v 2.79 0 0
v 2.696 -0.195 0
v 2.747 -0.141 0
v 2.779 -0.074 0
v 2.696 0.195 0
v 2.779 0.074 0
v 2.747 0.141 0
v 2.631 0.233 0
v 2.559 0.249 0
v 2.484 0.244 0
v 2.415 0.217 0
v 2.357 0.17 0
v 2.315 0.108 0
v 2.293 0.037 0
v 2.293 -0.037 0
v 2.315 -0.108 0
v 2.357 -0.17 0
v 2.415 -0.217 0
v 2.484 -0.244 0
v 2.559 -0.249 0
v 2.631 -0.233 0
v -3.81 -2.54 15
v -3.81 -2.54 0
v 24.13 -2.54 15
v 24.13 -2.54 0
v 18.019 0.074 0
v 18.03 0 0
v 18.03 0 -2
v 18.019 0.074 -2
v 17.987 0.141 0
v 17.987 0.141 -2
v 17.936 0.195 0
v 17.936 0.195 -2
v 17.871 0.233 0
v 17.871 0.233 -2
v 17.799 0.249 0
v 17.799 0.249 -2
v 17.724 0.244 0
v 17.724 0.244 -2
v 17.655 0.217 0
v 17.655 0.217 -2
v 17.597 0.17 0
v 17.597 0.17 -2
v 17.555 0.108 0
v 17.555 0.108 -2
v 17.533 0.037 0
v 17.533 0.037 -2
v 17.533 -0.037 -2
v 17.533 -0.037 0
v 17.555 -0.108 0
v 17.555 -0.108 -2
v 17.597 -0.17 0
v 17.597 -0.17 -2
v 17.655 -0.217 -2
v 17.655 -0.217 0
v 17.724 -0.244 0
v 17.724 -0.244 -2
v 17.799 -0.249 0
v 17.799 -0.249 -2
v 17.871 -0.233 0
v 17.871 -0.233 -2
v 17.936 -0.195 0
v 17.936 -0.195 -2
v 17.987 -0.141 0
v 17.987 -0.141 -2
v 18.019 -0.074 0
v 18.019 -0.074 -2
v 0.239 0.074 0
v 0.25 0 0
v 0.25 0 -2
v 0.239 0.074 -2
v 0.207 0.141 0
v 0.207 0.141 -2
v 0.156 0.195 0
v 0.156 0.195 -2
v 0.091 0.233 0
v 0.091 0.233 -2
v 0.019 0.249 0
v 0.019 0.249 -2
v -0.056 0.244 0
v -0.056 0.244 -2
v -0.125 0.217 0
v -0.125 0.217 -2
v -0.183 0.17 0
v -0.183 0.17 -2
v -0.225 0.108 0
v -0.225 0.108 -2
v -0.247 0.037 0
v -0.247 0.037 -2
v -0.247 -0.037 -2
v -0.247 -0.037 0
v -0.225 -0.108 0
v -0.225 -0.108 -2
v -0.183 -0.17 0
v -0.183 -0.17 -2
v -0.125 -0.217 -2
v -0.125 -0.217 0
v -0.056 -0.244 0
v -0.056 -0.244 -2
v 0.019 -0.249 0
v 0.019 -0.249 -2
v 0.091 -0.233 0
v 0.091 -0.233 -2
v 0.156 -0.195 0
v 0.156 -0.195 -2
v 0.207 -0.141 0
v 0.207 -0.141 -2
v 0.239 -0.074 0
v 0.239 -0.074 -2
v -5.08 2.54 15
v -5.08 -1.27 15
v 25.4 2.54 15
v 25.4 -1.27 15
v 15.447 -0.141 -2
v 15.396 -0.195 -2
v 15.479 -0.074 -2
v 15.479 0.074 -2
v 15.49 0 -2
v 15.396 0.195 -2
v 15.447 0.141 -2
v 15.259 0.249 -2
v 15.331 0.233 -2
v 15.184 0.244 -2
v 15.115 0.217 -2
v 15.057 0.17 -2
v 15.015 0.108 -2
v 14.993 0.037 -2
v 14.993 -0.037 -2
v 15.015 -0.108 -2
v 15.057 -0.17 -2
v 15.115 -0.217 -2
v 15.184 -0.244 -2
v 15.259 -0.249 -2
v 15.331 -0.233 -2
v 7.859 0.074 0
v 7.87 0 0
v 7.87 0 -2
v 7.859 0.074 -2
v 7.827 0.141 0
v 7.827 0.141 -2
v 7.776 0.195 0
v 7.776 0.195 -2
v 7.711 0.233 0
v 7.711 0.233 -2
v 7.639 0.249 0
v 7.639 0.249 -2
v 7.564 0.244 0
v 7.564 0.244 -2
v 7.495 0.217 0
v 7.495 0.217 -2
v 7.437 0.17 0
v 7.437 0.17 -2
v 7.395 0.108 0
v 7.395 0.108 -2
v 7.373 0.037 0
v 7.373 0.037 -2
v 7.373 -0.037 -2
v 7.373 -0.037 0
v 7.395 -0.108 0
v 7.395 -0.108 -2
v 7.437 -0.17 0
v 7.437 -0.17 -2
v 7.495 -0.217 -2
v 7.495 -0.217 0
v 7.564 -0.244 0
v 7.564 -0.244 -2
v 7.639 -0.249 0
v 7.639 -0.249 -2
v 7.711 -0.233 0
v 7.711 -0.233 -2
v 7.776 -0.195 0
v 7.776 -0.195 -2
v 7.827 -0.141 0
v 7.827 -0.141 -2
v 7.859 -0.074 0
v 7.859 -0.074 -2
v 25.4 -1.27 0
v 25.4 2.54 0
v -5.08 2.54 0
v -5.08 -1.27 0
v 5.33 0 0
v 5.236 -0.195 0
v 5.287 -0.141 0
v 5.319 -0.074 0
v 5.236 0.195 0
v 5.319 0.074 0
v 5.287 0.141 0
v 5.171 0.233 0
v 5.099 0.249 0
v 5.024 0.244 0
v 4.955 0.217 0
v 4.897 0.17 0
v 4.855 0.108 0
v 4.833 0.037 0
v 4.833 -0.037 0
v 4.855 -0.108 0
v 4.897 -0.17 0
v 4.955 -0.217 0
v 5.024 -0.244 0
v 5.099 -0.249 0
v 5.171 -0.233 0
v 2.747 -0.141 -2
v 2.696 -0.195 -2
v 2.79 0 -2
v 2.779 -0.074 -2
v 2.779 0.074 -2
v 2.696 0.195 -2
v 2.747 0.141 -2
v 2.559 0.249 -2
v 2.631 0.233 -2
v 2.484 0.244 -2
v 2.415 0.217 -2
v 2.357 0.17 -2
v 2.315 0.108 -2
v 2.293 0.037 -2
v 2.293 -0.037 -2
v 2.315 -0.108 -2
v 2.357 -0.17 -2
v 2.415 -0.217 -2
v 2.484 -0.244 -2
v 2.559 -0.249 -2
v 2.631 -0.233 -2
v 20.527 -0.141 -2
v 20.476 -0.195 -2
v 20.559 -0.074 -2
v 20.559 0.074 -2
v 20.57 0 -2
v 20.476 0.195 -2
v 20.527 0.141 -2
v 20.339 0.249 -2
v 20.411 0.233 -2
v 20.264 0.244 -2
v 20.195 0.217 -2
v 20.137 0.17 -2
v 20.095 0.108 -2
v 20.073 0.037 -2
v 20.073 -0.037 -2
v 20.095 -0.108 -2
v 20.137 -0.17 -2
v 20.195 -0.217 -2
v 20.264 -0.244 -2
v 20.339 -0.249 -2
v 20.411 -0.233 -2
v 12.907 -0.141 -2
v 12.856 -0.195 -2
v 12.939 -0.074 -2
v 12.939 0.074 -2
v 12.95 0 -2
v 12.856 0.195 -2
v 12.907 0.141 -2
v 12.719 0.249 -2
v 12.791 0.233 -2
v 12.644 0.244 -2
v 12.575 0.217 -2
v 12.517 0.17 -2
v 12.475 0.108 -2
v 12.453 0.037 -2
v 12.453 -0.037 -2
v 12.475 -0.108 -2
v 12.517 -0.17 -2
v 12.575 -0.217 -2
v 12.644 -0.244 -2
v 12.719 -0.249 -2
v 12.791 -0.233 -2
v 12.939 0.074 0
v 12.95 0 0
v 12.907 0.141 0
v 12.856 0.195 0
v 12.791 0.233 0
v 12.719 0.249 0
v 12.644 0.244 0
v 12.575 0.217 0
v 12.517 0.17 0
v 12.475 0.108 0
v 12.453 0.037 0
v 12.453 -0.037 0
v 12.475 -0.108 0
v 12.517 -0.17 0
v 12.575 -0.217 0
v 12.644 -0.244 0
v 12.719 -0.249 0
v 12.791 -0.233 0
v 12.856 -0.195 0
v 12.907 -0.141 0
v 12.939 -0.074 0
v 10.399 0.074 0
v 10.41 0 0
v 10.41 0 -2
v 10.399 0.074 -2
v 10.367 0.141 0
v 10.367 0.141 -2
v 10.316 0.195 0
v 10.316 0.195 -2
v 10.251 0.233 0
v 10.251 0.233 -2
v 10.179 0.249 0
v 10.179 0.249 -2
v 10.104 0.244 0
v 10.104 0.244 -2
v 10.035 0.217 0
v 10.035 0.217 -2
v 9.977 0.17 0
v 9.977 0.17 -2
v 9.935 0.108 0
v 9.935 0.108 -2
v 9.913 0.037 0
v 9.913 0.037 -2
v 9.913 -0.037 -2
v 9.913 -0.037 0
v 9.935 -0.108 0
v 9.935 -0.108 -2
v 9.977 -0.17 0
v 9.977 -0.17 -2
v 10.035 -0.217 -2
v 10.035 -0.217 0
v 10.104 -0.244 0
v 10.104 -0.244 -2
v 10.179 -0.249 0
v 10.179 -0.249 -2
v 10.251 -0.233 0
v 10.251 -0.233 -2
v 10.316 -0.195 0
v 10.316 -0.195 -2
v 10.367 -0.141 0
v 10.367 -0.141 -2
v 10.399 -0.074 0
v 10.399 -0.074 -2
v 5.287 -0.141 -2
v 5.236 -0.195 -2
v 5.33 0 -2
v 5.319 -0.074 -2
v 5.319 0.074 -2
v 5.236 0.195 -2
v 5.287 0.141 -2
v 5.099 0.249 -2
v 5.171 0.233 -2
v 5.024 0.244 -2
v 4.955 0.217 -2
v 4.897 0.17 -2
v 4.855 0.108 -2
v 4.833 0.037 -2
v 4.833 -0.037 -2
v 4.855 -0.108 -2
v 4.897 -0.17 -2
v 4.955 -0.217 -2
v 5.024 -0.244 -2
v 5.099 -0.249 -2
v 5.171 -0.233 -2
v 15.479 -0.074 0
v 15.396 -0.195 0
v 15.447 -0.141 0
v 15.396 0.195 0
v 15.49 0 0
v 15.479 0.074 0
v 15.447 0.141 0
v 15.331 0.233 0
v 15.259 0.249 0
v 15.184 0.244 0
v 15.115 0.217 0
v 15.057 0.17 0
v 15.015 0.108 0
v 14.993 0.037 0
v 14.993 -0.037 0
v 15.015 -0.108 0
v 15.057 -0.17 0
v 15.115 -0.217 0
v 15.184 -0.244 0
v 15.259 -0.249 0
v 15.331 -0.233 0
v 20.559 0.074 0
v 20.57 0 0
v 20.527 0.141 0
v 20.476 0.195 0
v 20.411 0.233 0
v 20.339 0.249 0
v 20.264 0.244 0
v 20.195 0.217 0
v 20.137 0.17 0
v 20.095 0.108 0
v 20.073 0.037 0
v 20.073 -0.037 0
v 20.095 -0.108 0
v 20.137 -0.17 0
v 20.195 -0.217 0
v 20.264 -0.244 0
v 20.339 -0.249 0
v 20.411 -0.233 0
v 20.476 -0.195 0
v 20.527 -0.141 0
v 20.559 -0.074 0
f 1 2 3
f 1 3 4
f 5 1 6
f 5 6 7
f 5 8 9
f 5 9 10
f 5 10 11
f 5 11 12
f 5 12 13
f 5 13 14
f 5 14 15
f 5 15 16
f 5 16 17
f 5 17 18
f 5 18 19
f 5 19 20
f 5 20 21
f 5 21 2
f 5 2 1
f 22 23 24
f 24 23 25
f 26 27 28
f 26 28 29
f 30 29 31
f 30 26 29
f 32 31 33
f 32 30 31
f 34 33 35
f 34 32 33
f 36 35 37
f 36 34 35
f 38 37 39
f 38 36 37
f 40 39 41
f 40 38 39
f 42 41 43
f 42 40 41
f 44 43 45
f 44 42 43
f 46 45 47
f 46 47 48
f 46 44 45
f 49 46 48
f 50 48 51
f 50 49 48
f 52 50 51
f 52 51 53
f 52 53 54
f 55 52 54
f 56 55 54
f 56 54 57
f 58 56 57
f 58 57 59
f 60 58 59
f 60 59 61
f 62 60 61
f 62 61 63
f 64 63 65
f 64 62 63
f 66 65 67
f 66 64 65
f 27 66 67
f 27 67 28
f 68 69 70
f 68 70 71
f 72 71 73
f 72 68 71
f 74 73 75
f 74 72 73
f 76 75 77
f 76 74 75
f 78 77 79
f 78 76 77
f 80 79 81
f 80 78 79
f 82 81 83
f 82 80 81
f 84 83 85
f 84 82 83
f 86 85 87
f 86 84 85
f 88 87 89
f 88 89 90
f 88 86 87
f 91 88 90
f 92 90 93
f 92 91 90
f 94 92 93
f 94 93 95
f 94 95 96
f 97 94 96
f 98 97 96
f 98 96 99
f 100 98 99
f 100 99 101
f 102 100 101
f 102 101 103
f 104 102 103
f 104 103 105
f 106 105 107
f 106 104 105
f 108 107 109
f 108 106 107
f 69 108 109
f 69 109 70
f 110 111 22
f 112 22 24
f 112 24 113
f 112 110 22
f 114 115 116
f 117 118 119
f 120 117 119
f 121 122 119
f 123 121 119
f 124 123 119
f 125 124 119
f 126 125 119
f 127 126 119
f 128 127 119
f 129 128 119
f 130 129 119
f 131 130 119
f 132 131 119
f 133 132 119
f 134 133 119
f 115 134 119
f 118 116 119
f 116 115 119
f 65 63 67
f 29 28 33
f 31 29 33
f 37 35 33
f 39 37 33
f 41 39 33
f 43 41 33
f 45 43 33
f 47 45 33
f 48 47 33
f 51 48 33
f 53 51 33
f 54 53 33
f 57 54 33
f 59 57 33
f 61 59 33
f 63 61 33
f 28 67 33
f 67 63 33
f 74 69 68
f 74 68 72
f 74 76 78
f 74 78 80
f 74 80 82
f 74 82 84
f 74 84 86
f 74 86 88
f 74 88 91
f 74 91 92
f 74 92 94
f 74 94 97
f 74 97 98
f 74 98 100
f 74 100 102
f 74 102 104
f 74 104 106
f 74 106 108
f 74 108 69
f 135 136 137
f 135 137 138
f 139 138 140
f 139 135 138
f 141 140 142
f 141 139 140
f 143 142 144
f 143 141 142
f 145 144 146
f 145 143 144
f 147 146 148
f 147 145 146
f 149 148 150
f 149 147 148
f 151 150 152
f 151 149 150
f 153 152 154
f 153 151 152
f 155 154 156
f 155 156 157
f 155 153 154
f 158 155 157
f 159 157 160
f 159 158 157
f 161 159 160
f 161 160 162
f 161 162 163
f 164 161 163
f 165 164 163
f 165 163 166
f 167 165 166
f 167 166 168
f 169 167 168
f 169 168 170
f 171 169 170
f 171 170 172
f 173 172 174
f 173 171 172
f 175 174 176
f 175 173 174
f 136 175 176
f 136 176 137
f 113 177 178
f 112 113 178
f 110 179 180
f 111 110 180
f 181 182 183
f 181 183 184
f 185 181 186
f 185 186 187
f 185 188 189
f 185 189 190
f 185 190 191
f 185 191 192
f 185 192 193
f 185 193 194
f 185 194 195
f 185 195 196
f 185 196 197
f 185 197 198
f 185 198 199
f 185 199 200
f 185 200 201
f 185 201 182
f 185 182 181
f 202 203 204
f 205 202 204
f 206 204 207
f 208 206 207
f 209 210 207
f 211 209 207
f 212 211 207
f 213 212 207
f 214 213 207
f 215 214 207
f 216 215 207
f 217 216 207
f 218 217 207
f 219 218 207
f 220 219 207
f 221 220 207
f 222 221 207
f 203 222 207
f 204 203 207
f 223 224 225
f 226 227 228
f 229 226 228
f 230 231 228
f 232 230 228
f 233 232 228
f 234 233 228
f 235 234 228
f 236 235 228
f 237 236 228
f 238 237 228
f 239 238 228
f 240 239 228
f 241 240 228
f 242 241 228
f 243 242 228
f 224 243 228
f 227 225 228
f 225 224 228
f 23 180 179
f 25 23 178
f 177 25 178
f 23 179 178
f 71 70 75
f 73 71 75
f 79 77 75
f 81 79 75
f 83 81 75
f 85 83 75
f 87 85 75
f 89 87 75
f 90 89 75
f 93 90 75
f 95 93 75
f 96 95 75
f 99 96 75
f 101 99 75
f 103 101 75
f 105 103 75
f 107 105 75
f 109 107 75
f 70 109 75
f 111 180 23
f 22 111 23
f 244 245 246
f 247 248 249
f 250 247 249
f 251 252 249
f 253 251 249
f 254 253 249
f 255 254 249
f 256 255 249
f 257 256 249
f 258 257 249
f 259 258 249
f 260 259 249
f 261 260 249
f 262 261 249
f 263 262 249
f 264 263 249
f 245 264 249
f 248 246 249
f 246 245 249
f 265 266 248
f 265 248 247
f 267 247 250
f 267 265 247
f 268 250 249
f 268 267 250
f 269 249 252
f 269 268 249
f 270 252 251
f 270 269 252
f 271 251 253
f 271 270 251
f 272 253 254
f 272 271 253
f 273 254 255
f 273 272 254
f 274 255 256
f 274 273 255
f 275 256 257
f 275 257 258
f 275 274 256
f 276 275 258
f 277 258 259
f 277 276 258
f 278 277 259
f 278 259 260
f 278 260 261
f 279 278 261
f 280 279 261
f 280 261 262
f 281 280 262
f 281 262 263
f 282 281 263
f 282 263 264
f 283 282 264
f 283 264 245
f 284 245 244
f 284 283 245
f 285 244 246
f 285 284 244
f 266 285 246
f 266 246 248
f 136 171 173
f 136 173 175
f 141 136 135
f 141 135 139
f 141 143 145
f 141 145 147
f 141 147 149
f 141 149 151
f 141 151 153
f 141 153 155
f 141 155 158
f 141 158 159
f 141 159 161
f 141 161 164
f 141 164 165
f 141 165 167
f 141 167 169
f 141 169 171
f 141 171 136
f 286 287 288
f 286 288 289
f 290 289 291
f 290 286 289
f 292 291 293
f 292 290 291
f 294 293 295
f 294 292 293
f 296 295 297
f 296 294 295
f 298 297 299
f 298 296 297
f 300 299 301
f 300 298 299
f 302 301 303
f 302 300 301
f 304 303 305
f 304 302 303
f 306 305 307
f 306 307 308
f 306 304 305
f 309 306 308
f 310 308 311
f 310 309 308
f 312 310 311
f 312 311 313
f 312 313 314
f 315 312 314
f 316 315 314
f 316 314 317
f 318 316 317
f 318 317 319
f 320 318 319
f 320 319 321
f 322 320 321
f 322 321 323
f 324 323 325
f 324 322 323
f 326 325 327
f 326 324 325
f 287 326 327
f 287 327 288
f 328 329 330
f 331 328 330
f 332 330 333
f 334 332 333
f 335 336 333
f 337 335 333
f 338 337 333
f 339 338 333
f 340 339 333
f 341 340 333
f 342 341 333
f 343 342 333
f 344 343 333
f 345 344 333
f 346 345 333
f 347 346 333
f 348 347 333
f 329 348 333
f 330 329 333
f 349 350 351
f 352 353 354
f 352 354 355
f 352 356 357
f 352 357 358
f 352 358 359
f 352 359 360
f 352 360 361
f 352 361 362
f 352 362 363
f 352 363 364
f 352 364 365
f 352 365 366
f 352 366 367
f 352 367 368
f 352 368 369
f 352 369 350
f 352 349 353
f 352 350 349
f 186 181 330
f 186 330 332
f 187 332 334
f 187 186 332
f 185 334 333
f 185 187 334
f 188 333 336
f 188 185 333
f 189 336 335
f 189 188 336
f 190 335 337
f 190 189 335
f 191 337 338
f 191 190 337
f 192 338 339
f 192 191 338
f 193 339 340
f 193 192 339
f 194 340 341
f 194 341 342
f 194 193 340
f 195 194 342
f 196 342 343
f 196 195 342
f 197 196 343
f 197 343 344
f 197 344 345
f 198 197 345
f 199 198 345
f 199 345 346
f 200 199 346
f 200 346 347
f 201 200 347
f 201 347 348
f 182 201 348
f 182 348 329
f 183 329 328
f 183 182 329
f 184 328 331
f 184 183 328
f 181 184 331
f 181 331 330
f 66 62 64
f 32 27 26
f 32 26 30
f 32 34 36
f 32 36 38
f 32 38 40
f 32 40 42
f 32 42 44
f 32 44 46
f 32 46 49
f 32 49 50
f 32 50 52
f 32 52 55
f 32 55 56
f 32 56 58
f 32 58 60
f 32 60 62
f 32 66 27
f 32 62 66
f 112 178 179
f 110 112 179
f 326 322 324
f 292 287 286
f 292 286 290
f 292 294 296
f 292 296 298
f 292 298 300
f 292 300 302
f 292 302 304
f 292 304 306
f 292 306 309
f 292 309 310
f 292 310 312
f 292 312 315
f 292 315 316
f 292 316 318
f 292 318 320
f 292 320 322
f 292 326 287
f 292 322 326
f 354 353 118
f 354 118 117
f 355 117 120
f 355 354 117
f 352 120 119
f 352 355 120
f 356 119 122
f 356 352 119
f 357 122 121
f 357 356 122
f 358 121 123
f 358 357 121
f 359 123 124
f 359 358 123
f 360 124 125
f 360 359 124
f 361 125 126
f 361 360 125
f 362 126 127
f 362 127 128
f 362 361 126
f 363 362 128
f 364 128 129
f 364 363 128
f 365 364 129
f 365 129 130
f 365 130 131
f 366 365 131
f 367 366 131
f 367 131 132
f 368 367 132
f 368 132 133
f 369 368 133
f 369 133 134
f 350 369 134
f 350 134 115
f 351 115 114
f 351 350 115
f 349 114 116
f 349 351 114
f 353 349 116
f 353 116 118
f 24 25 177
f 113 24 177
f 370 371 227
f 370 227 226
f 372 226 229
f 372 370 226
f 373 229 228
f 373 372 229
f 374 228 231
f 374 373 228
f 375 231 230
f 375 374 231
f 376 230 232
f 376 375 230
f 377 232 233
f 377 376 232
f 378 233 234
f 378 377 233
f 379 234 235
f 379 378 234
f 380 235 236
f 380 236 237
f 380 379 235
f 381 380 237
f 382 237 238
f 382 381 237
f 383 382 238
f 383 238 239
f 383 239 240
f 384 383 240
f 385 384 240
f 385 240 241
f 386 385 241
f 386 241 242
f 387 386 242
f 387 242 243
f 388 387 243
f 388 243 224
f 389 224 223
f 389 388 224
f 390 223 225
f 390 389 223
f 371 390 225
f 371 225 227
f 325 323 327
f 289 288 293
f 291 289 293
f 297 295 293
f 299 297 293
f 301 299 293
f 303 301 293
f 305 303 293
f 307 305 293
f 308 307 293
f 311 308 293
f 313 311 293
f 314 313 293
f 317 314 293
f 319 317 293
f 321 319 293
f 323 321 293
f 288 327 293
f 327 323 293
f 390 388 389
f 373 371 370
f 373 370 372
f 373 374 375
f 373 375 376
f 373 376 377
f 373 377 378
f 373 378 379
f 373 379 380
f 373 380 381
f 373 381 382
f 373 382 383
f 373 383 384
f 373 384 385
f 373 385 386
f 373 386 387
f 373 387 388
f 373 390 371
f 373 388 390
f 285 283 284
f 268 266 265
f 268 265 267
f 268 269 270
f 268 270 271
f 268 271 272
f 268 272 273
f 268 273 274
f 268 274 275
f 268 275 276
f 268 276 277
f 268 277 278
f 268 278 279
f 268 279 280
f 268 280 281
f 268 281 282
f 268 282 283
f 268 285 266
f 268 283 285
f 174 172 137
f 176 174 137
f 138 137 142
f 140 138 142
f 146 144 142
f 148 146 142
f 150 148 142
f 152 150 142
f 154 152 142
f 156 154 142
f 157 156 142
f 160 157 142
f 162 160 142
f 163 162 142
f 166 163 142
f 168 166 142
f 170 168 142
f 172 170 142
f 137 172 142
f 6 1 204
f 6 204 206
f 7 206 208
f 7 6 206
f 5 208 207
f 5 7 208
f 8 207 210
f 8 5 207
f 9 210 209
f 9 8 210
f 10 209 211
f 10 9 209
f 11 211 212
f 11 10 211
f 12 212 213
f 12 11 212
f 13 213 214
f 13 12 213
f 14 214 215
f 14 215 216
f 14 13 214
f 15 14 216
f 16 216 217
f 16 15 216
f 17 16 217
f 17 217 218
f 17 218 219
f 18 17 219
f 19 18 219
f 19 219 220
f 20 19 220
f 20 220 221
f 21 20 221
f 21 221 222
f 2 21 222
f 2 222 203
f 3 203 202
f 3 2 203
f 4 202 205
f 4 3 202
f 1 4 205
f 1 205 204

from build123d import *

# Parameters (mm, degrees)
COMPONENT_OUTLINE_DEPTH = 15
SKETCH2_R               = 0.25
EXTRUDE_1_DEPTH         = 2
SKETCH3_R               = 0.25
EXTRUDE_2_DEPTH         = 2
SKETCH4_R               = 0.25
EXTRUDE_3_DEPTH         = 2
SKETCH5_R               = 0.25
EXTRUDE_4_DEPTH         = 2
SKETCH6_R               = 0.25
EXTRUDE_5_DEPTH         = 2
SKETCH7_R               = 0.25
EXTRUDE_6_DEPTH         = 2
SKETCH8_R               = 0.25
EXTRUDE_7_DEPTH         = 2
SKETCH9_R               = 0.25
EXTRUDE_8_DEPTH         = 2
SKETCH10_R              = 0.25
EXTRUDE_9_DEPTH         = 2


with BuildPart() as part:
    # Sketch1 → Component_Outline (new body)
    with BuildSketch(Plane.XY):
        Polygon((-5.08, 2.54), (-5.08, -1.27), (-3.81, -2.54), (24.13, -2.54), (25.4, -1.27), (25.4, 2.54), align=None)
    extrude(amount=COMPONENT_OUTLINE_DEPTH)


with BuildPart() as body_2:
    # Sketch2 → Extrude 1 (new body)
    with BuildSketch(Plane.XY):
        Circle(SKETCH2_R)
    extrude(amount=-EXTRUDE_1_DEPTH)


with BuildPart() as body_3:
    # Sketch3 → Extrude 2 (new body)
    with BuildSketch(Plane.XY):
        with Locations((2.54, 0)):
            Circle(SKETCH3_R)
    extrude(amount=-EXTRUDE_2_DEPTH)


with BuildPart() as body_4:
    # Sketch4 → Extrude 3 (new body)
    with BuildSketch(Plane.XY):
        with Locations((5.08, 0)):
            Circle(SKETCH4_R)
    extrude(amount=-EXTRUDE_3_DEPTH)


with BuildPart() as body_5:
    # Sketch5 → Extrude 4 (new body)
    with BuildSketch(Plane.XY):
        with Locations((7.62, 0)):
            Circle(SKETCH5_R)
    extrude(amount=-EXTRUDE_4_DEPTH)


with BuildPart() as body_6:
    # Sketch6 → Extrude 5 (new body)
    with BuildSketch(Plane.XY):
        with Locations((10.16, 0)):
            Circle(SKETCH6_R)
    extrude(amount=-EXTRUDE_5_DEPTH)


with BuildPart() as body_7:
    # Sketch7 → Extrude 6 (new body)
    with BuildSketch(Plane.XY):
        with Locations((12.7, 0)):
            Circle(SKETCH7_R)
    extrude(amount=-EXTRUDE_6_DEPTH)


with BuildPart() as body_8:
    # Sketch8 → Extrude 7 (new body)
    with BuildSketch(Plane.XY):
        with Locations((15.24, 0)):
            Circle(SKETCH8_R)
    extrude(amount=-EXTRUDE_7_DEPTH)


with BuildPart() as body_9:
    # Sketch9 → Extrude 8 (new body)
    with BuildSketch(Plane.XY):
        with Locations((17.78, 0)):
            Circle(SKETCH9_R)
    extrude(amount=-EXTRUDE_8_DEPTH)


with BuildPart() as body_10:
    # Sketch10 → Extrude 9 (new body)
    with BuildSketch(Plane.XY):
        with Locations((20.32, 0)):
            Circle(SKETCH10_R)
    extrude(amount=-EXTRUDE_9_DEPTH)


solid = Compound([part.part, body_2.part, body_3.part, body_4.part, body_5.part, body_6.part, body_7.part, body_8.part, body_9.part, body_10.part])
